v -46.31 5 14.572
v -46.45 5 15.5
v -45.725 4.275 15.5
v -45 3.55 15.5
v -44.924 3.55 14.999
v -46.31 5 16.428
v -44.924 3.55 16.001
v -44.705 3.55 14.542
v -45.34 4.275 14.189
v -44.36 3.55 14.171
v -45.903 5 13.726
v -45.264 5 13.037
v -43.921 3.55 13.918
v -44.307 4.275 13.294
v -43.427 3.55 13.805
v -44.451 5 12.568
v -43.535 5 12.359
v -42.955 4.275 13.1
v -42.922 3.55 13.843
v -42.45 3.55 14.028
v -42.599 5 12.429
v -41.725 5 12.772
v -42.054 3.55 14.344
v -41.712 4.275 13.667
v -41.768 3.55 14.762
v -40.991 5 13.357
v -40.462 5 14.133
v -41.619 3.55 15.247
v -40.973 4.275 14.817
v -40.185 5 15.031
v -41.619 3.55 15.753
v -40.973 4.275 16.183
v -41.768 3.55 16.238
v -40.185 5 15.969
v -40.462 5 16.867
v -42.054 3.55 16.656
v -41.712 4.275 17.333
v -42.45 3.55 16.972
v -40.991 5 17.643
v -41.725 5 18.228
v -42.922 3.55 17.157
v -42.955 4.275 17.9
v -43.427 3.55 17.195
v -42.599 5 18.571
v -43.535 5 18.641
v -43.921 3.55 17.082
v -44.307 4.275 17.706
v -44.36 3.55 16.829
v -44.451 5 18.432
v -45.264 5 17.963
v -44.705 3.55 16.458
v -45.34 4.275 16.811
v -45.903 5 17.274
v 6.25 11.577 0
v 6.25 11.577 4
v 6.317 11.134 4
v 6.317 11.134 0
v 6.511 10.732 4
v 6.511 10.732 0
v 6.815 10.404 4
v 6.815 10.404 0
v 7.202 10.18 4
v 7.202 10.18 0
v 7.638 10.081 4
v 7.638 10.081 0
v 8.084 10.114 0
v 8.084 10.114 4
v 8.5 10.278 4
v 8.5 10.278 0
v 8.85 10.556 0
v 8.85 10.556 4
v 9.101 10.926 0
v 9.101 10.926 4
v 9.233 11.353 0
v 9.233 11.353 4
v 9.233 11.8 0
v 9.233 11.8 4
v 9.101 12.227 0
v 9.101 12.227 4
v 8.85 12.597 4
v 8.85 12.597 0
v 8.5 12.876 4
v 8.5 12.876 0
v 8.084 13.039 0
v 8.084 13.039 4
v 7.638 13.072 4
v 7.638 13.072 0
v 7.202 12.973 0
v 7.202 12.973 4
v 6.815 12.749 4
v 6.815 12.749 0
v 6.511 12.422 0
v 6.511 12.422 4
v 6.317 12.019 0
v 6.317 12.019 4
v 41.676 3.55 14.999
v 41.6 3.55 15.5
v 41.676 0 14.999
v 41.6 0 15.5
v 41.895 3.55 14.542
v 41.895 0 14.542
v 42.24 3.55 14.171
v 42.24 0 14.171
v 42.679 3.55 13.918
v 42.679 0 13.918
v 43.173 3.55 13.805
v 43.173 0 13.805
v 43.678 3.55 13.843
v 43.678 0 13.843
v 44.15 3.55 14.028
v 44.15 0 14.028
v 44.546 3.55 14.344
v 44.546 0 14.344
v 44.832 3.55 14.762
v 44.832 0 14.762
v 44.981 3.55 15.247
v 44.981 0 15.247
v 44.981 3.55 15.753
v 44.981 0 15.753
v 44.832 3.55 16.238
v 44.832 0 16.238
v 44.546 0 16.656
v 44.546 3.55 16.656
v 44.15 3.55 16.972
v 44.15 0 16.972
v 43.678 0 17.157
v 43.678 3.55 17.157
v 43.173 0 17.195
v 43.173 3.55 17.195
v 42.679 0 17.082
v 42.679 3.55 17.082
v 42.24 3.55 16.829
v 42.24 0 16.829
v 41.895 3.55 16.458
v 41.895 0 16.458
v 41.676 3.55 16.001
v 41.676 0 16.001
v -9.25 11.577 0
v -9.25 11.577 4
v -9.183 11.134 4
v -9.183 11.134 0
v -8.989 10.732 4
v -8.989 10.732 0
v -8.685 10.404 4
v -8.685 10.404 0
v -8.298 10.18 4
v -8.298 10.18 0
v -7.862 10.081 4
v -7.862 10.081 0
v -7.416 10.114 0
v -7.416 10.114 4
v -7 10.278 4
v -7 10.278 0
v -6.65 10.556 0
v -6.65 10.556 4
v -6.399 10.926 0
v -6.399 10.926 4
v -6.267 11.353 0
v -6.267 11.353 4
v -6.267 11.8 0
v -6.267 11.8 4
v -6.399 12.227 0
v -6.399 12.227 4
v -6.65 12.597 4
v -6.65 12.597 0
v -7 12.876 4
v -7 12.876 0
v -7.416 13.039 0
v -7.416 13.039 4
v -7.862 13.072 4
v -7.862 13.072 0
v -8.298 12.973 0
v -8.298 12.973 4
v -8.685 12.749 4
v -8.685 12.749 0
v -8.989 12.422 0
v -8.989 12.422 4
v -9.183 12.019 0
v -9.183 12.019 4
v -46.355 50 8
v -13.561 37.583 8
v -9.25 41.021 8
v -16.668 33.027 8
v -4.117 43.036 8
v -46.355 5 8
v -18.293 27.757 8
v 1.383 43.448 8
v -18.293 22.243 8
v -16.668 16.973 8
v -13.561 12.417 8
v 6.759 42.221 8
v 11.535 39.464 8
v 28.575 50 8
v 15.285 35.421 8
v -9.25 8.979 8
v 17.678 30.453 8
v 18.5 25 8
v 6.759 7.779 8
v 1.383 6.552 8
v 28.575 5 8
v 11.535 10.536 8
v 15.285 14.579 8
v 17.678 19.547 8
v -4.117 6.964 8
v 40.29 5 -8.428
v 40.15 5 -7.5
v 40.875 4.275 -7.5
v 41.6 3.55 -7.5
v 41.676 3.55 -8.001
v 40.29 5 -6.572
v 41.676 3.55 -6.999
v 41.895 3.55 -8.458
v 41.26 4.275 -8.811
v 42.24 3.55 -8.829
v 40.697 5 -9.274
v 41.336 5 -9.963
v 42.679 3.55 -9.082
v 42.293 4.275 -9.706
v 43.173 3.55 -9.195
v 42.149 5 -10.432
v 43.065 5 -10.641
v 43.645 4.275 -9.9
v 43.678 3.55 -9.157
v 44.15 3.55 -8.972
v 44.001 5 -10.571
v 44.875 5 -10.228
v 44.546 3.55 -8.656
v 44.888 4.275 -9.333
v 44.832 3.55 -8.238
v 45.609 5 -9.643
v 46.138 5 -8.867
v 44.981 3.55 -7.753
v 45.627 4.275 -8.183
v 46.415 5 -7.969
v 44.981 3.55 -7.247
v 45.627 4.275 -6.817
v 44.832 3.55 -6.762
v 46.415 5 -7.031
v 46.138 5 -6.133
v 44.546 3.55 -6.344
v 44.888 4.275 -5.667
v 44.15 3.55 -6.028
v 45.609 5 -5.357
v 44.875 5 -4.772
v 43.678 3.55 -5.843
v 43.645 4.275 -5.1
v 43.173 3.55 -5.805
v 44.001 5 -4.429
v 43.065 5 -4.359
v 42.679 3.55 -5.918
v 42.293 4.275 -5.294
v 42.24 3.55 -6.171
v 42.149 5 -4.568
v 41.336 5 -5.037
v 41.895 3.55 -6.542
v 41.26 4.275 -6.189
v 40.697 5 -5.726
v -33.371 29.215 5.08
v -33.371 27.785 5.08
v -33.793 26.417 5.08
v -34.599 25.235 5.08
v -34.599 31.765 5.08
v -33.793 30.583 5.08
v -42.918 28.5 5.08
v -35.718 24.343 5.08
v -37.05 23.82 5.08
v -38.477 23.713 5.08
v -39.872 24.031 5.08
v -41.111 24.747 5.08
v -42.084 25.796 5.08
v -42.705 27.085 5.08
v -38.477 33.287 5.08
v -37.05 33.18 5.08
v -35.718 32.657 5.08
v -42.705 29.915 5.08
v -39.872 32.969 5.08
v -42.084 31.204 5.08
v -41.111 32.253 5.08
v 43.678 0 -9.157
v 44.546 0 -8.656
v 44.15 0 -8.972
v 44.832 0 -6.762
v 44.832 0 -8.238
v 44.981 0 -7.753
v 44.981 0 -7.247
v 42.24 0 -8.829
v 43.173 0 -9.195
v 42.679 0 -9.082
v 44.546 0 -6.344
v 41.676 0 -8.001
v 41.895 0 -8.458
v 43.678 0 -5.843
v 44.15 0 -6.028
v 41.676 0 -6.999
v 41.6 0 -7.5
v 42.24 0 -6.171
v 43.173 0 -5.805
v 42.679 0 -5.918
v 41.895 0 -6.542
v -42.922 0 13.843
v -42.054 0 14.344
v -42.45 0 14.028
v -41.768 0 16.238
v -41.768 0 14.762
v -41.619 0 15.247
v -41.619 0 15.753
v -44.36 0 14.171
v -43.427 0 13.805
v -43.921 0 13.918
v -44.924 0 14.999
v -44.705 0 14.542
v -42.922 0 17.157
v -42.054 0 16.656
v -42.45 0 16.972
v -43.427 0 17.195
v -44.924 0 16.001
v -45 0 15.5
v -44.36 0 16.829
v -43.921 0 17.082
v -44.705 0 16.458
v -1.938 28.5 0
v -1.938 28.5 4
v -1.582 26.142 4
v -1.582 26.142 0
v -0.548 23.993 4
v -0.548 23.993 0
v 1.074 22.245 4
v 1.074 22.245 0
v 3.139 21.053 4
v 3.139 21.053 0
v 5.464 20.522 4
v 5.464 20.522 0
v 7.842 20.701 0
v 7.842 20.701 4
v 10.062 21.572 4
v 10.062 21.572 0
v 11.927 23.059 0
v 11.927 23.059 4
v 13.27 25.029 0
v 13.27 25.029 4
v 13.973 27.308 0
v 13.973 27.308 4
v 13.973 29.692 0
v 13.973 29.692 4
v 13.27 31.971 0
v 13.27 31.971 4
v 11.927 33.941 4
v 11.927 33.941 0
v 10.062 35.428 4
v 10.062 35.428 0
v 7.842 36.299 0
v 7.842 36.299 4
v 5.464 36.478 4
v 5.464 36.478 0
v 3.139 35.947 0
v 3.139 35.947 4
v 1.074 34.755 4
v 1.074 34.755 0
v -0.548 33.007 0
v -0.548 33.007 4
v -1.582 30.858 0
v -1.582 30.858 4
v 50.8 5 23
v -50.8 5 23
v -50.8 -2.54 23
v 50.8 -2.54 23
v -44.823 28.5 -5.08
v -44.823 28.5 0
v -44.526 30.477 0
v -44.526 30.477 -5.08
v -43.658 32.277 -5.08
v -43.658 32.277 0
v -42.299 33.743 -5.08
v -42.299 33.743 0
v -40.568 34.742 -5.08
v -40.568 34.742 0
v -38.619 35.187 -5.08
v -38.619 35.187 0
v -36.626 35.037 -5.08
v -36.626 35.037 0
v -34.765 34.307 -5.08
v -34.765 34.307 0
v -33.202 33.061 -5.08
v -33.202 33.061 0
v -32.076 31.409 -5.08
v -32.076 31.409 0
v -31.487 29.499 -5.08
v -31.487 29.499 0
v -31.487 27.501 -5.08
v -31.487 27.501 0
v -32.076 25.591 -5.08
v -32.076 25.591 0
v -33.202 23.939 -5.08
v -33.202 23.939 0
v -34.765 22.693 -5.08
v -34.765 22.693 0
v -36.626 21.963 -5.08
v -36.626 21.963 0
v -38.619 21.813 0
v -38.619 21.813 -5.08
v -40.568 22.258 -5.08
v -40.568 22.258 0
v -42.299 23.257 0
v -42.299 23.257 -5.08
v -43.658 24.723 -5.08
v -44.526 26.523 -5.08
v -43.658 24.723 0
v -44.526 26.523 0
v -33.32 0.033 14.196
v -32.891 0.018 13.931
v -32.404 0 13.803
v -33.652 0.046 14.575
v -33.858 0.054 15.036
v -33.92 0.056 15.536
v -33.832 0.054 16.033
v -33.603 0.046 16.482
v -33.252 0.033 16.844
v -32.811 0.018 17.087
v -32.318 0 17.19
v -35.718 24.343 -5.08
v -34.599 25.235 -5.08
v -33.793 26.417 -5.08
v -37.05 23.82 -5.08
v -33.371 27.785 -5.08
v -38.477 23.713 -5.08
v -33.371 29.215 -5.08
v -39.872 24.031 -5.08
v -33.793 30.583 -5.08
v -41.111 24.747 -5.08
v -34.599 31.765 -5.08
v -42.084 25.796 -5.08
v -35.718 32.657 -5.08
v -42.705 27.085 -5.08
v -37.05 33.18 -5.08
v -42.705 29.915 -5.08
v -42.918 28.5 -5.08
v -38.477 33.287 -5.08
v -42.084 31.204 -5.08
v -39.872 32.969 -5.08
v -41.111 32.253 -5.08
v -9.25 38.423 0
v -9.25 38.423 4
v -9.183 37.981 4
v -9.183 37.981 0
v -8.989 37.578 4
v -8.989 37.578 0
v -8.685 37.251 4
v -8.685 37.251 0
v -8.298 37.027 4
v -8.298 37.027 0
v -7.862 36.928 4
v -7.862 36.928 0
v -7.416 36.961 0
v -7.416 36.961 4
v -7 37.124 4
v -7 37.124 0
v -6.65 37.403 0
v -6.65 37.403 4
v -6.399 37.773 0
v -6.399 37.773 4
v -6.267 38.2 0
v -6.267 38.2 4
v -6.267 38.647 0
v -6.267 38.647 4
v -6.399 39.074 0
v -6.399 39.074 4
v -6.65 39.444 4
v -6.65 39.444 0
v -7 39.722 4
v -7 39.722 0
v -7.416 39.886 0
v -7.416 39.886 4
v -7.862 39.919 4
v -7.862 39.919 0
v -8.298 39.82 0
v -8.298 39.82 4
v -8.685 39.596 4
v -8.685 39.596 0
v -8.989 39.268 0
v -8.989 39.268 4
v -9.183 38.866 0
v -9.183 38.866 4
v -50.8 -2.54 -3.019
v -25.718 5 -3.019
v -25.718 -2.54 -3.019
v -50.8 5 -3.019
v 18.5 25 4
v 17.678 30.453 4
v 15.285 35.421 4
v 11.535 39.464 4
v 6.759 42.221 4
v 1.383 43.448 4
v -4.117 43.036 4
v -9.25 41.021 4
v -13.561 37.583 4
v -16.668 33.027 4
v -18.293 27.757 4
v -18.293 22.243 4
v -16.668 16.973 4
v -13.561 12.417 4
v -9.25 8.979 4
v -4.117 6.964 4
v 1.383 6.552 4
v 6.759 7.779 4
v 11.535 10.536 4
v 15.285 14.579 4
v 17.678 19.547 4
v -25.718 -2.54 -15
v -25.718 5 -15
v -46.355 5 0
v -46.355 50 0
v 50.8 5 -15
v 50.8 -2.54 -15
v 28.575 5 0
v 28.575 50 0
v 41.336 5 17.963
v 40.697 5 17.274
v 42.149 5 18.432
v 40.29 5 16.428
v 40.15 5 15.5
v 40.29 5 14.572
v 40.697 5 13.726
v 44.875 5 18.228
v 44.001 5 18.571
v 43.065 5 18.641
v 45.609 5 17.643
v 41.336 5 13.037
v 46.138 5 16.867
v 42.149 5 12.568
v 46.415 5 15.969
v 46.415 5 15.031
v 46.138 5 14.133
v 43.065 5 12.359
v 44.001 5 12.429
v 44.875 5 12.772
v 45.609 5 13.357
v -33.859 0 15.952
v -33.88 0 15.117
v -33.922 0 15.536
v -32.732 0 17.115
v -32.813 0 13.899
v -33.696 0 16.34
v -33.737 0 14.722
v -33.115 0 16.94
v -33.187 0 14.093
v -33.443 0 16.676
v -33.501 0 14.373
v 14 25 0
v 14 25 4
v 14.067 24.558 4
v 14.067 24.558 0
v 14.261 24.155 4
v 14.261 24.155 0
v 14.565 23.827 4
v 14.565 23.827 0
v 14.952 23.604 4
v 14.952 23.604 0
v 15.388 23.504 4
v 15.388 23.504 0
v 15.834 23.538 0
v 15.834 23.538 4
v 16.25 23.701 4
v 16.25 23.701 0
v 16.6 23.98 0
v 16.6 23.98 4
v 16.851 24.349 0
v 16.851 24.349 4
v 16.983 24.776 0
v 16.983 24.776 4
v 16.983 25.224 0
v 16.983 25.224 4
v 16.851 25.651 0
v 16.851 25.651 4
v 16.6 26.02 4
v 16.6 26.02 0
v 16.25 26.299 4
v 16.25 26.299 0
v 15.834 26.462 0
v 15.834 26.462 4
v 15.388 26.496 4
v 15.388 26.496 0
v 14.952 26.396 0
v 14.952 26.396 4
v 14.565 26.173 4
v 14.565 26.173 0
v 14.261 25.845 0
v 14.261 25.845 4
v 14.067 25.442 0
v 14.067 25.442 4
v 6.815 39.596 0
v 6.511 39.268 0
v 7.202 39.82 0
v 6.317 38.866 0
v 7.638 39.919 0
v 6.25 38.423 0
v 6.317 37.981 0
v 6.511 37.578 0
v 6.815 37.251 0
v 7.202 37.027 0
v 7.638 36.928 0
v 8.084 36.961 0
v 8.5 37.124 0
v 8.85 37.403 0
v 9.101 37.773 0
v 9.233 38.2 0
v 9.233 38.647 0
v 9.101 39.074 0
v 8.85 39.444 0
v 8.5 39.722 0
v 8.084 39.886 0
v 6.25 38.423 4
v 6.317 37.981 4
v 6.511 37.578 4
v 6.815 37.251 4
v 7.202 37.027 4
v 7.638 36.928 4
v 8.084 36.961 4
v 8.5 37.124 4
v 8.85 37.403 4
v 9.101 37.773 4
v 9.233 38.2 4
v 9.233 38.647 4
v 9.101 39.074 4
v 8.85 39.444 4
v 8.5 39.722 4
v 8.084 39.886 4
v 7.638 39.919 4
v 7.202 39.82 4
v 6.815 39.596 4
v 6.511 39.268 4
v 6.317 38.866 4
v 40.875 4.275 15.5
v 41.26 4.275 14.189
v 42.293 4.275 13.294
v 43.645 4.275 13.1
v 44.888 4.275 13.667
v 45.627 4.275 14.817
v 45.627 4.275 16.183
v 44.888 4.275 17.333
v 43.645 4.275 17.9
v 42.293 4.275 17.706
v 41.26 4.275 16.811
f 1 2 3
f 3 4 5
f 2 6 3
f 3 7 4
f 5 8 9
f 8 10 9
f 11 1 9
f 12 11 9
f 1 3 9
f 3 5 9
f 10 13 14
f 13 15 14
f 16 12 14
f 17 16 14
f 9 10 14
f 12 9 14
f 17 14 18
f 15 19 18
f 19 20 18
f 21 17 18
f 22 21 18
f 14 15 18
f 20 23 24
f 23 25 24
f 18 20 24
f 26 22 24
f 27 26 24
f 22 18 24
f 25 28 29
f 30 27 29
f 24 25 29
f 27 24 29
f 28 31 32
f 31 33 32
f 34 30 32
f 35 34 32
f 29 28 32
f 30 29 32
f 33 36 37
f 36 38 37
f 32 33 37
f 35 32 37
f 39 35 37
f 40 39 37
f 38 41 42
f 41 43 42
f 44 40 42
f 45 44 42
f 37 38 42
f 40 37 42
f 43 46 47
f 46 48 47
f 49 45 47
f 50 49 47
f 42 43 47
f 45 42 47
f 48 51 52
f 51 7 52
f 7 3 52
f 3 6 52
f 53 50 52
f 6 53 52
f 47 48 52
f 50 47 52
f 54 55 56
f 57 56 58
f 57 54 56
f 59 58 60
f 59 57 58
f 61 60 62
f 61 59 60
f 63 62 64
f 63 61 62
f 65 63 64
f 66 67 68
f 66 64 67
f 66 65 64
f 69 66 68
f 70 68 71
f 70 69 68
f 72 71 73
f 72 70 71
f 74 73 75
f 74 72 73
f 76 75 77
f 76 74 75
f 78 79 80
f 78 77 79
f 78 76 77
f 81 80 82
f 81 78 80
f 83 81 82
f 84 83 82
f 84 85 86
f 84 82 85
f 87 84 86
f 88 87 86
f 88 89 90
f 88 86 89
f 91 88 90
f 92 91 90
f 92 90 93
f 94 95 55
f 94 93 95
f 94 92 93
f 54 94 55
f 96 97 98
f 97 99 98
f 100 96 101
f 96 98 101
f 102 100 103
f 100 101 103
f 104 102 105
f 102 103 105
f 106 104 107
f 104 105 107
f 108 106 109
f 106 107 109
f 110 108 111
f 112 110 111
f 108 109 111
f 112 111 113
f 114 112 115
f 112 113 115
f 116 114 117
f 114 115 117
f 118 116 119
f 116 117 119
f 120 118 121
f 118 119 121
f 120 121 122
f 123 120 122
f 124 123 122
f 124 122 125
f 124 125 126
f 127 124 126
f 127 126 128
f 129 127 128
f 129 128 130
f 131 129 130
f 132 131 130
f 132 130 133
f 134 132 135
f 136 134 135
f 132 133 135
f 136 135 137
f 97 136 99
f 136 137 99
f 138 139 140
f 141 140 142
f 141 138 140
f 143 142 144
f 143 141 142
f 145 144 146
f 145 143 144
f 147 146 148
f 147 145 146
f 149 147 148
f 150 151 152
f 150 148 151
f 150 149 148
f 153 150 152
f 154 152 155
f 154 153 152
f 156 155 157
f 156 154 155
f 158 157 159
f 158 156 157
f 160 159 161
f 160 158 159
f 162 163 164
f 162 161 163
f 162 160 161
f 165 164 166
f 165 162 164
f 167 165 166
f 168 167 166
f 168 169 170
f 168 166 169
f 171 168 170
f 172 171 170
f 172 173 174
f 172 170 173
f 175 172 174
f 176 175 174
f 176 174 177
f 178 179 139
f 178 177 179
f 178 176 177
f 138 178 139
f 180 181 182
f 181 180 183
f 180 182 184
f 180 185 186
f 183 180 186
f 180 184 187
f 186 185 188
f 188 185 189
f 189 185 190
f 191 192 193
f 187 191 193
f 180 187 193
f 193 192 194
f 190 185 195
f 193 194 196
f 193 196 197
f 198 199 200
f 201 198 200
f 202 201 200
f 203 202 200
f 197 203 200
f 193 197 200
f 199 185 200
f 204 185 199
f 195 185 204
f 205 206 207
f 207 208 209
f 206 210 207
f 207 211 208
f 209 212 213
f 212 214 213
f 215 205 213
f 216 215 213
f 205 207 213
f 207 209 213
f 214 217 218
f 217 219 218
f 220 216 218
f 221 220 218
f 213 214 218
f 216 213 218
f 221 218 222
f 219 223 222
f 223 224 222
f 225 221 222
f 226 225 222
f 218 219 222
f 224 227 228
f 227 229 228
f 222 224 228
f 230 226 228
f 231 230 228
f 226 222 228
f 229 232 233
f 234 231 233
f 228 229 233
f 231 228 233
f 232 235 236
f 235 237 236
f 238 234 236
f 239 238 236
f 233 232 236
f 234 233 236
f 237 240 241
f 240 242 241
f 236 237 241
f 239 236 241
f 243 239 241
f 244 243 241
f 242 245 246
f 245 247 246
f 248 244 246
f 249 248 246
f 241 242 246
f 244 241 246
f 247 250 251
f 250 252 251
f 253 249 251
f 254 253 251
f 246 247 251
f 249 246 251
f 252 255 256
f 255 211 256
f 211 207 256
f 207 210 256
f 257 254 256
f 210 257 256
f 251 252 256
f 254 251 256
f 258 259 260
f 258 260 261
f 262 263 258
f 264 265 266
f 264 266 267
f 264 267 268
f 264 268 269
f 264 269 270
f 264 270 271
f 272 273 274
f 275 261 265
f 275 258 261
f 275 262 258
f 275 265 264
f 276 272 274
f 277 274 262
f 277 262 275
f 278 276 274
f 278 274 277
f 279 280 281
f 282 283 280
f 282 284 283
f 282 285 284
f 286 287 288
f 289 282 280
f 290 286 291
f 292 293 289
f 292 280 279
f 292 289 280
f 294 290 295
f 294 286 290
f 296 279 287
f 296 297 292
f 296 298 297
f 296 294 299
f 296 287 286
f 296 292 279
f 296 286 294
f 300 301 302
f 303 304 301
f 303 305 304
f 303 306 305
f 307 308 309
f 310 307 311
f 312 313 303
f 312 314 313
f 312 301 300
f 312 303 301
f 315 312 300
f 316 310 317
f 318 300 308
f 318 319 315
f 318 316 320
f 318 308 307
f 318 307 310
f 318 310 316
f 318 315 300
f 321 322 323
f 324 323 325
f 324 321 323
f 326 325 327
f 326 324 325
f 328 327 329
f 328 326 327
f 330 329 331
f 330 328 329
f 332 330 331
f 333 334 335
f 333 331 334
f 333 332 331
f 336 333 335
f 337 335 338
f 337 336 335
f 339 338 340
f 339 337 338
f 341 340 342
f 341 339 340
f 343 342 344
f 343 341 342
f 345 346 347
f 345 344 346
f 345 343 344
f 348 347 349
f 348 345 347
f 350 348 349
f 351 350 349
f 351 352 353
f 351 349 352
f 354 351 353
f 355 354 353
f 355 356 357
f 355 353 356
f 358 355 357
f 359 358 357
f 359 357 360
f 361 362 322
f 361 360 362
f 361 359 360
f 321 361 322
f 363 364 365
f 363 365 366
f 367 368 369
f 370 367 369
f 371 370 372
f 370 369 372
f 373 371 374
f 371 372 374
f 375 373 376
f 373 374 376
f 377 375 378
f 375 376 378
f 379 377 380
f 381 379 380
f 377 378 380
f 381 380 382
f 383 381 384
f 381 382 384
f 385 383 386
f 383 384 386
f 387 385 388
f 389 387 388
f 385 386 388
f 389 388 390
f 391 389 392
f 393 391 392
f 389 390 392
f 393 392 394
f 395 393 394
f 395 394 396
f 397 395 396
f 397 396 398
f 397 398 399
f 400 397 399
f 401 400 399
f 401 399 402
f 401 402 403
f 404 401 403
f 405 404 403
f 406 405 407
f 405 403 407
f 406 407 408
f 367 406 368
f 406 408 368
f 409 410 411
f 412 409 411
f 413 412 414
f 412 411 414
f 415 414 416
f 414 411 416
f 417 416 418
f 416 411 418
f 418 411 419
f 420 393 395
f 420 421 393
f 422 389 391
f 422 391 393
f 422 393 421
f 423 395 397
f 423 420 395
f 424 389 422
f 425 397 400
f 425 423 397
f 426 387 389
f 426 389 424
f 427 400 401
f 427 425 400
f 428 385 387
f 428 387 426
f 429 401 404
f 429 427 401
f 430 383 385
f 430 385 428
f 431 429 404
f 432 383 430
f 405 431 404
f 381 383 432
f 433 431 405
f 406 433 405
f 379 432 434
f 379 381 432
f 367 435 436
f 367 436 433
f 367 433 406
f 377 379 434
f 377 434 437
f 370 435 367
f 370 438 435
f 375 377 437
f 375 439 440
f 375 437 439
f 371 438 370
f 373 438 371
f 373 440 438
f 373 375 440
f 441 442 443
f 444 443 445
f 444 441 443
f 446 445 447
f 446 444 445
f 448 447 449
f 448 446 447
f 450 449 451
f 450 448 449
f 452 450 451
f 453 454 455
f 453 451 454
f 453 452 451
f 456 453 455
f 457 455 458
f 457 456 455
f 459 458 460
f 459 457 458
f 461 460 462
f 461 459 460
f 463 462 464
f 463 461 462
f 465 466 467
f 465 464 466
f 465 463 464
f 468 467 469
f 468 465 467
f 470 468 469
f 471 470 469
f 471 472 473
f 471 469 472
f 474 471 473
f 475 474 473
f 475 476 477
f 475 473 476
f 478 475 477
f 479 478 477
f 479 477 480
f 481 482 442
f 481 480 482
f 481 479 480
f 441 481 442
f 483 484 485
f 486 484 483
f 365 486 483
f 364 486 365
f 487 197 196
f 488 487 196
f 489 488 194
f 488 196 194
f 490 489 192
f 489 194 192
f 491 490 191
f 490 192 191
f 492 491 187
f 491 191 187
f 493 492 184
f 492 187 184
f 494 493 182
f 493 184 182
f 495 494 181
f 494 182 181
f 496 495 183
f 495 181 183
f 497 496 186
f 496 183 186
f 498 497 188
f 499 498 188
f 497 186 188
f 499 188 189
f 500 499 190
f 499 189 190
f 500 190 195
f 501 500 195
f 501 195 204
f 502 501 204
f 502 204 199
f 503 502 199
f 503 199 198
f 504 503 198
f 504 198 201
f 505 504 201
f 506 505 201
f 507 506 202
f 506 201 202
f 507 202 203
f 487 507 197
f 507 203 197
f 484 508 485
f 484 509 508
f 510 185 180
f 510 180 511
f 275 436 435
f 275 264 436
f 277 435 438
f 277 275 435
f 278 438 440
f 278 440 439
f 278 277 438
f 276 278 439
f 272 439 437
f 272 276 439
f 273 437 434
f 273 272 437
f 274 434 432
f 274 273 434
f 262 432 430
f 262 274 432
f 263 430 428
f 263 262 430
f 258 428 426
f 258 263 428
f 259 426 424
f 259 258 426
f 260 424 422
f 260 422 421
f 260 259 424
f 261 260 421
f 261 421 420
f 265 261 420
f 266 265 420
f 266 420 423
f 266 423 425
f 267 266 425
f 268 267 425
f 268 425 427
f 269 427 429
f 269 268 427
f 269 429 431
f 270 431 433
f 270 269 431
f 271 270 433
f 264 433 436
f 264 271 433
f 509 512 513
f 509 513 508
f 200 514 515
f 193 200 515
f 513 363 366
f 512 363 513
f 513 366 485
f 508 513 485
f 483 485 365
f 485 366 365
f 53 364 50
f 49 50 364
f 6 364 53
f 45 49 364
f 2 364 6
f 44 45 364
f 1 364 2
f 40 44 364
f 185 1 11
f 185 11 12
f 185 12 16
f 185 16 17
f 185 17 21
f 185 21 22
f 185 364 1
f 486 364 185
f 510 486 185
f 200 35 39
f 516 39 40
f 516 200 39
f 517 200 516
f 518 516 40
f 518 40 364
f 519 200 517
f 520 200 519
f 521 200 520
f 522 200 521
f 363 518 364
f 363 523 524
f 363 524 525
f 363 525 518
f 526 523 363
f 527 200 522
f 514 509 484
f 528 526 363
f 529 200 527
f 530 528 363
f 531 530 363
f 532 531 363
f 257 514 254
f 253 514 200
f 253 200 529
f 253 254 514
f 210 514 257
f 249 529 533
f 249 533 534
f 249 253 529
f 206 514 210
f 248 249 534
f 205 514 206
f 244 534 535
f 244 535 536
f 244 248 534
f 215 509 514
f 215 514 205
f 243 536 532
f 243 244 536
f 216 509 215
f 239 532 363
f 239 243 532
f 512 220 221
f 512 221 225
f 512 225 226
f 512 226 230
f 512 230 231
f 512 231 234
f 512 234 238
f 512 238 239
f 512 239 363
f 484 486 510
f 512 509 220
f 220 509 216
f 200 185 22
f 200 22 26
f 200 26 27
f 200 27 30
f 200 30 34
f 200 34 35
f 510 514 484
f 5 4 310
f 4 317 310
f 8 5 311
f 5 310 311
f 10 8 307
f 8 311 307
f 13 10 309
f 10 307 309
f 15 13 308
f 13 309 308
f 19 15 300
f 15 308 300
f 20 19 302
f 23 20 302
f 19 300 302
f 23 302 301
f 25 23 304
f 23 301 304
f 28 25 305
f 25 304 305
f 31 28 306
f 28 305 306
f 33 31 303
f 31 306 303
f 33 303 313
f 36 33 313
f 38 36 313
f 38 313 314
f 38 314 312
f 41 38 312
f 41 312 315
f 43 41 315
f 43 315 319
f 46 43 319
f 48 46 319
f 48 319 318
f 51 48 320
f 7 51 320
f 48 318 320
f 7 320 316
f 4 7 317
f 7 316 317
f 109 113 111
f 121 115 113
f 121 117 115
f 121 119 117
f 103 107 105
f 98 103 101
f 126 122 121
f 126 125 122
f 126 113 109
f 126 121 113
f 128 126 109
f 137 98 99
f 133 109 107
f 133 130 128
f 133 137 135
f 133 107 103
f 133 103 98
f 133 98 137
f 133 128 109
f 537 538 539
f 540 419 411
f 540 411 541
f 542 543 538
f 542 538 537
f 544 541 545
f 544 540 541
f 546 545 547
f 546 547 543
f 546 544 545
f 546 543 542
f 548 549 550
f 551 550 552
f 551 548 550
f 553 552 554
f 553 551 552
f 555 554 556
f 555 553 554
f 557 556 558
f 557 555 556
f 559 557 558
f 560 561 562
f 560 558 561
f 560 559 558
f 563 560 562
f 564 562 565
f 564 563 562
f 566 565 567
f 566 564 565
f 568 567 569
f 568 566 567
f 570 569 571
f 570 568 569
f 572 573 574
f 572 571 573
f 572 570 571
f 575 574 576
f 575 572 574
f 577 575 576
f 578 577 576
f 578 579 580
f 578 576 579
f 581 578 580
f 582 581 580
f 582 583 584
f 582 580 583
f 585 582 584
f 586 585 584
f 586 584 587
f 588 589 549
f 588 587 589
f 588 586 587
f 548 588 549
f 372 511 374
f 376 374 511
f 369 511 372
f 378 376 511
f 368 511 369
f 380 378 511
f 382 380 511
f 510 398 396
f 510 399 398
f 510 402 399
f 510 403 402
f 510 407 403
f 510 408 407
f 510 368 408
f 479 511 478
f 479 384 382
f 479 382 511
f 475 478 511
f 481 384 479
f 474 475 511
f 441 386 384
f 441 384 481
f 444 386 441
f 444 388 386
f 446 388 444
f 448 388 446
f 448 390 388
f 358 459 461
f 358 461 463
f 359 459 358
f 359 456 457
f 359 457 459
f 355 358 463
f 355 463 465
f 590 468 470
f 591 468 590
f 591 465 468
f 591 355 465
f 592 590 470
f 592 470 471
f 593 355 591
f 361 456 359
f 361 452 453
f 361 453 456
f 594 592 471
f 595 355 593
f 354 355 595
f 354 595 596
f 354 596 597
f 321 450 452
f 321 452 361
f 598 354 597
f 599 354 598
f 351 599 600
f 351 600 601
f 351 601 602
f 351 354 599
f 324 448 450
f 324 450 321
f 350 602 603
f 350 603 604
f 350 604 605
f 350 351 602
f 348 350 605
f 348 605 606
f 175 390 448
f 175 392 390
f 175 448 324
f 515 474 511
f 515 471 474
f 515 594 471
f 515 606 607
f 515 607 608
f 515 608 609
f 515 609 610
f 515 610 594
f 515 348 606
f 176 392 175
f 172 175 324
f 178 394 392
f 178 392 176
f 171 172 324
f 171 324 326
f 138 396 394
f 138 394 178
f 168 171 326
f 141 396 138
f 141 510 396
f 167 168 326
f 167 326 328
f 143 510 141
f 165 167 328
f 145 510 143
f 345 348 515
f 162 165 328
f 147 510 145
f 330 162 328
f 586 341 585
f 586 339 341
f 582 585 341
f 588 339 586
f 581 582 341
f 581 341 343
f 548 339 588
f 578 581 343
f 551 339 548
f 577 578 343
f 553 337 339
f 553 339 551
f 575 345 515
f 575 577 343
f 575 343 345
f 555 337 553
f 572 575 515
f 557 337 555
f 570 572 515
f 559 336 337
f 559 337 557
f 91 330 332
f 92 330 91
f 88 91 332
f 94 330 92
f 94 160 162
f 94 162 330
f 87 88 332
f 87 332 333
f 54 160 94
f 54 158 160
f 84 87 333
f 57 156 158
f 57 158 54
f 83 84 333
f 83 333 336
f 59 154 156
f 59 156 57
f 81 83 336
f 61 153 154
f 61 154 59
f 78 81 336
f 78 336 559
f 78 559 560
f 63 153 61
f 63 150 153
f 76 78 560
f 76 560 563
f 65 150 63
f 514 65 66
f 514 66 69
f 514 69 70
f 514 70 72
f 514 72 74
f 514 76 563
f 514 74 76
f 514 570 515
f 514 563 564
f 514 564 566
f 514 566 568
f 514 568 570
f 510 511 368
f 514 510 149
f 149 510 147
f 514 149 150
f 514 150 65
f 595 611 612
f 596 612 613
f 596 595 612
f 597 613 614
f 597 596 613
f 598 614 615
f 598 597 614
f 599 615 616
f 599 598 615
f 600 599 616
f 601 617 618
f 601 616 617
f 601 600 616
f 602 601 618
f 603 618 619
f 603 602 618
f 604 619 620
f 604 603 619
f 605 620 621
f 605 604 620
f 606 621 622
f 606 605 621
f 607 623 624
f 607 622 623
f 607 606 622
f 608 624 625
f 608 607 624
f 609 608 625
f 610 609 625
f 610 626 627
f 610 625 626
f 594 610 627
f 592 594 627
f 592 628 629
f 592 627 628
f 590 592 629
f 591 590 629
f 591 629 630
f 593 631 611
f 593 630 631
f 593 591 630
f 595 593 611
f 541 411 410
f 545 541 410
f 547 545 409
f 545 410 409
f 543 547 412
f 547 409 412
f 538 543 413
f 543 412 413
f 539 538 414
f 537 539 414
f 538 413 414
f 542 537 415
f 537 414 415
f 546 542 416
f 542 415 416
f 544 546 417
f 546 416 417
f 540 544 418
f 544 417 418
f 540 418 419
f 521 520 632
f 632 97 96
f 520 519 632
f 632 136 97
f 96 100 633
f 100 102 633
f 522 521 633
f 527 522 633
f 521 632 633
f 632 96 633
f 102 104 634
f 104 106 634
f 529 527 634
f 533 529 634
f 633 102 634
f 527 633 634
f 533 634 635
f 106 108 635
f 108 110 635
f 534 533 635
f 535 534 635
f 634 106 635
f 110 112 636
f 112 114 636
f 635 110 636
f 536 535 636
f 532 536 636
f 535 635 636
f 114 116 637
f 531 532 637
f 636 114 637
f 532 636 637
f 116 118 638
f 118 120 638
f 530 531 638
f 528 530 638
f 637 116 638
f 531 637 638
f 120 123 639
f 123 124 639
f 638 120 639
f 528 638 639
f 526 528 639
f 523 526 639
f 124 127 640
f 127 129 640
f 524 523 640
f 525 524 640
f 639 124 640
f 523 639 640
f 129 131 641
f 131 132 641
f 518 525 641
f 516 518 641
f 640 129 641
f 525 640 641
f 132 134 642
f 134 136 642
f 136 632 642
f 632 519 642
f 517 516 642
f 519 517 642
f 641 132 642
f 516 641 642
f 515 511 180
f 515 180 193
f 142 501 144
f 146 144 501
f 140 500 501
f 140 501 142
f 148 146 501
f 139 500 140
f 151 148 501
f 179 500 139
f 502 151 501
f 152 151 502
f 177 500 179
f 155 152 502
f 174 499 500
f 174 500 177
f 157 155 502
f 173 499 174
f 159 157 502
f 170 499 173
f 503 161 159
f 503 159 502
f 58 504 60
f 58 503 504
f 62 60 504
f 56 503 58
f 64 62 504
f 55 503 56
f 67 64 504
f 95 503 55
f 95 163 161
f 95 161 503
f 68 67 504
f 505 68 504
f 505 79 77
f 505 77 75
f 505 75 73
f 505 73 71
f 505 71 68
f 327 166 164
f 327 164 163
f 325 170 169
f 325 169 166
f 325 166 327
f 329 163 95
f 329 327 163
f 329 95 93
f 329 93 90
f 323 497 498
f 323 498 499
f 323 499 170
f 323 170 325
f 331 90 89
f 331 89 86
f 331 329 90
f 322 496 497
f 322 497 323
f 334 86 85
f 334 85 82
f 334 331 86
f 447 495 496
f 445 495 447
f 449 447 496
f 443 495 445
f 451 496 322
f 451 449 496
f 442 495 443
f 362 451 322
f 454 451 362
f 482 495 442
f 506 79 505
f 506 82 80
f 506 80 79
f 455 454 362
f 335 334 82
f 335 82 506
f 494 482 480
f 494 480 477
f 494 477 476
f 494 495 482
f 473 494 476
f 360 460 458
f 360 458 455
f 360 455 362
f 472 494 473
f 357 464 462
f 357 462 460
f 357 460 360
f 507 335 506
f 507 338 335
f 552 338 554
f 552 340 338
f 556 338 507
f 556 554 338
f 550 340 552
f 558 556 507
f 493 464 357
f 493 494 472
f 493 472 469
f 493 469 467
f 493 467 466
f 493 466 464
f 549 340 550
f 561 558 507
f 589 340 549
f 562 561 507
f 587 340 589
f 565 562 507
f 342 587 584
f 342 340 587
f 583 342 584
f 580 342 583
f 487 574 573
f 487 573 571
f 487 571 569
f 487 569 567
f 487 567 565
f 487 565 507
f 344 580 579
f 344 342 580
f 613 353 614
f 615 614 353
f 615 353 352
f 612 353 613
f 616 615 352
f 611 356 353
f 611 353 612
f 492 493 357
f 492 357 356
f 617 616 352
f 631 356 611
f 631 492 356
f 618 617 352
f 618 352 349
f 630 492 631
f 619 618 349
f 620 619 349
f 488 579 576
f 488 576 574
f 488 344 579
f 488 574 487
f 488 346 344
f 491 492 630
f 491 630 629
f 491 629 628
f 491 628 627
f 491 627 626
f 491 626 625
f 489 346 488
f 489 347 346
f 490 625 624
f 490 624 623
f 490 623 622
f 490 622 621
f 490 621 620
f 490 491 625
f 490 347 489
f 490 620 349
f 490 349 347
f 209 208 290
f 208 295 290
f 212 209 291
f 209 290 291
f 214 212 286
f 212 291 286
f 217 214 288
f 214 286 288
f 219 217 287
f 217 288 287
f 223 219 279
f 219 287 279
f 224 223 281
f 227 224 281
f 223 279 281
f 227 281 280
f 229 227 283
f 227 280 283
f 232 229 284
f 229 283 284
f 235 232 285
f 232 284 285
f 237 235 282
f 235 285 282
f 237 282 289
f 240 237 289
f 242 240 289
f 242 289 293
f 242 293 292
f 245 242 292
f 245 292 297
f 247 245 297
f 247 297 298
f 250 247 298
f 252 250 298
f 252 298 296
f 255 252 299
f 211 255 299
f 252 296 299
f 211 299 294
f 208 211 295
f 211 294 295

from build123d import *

# Parameters (mm, degrees)
SKETCH3_W                                       = 57.15
SKETCH3_H                                       = 50
BOSS_EXTRUDE1_DEPTH                             = 8
SKETCH3_3_R                                     = 1.5
SKETCH3_3_R_2                                   = 8
CUT_EXTRUDE2_DEPTH                              = 10
SKETCH4_R                                       = 18.5
CUT_EXTRUDE3_DEPTH                              = 4
BOSS_EXTRUDE2_DEPTH                             = 15
BOSS_EXTRUDE2_DEPTH_BACK                        = 23
SKETCH6_W                                       = 101.6
SKETCH6_H                                       = 5
CSK_FOR_M3_FLAT_HEAD_MACHINE_SCREW1_D           = 3.4
CSK_FOR_M3_FLAT_HEAD_MACHINE_SCREW1_CSINK_D     = 6.3
CSK_FOR_M3_FLAT_HEAD_MACHINE_SCREW1_CSINK_ANGLE = 90
CUT_EXTRUDE6_REACH                              = 555.432
SKETCH16_R                                      = 1.7
CUT_EXTRUDE7_REACH                              = 73.656
SKETCH17_W                                      = 25.08228791
SKETCH17_H                                      = 11.980848154
SKETCH18_W                                      = 17.78
SKETCH18_H                                      = 8
BOSS_EXTRUDE3_DEPTH                             = 45
SKETCH13_R                                      = 6.7056
SKETCH13_R_2                                    = 4.8006
BOSS_EXTRUDE4_DEPTH                             = 5.08
CUT_EXTRUDE8_START                              = -5.08
SKETCH19_R                                      = 4.8006
CUT_EXTRUDE8_DEPTH                              = 5.08
BOSS_EXTRUDE5_DEPTH                             = 2.54


with BuildPart() as part:
    # Sketch3 → Boss-Extrude1 (new body)
    with BuildSketch(Plane.XY):
        with Locations((0, 25)):
            Rectangle(SKETCH3_W, SKETCH3_H)
    extrude(amount=BOSS_EXTRUDE1_DEPTH)

    # Sketch3<3> → Cut-Extrude2 (cut)
    with BuildSketch(Plane.XY):
        with Locations(Location((-7.75, 38.423393759, 0), (0, 0, 180))):
            Circle(SKETCH3_3_R)
        with Locations(Location((7.75, 38.423393759, 0), (0, 0, 180))):
            Circle(SKETCH3_3_R)
        with Locations(Location((-7.75, 11.576606241, 0), (0, 0, 180))):
            Circle(SKETCH3_3_R)
        with Locations(Location((7.75, 11.576606241, 0), (0, 0, 180))):
            Circle(SKETCH3_3_R)
        with Locations(Location((15.5, 25, 0), (0, 0, 180))):
            Circle(SKETCH3_3_R)
        with Locations(Location((6.062177825, 28.499999999, 0), (0, 0, 180))):
            Circle(SKETCH3_3_R_2)
    extrude(amount=CUT_EXTRUDE2_DEPTH, mode=Mode.SUBTRACT)

    # Sketch4 → Cut-Extrude3 (cut)
    with BuildSketch(Plane.XY.offset(8)):
        with Locations((0, 25)):
            Circle(SKETCH4_R)
    extrude(amount=-CUT_EXTRUDE3_DEPTH, mode=Mode.SUBTRACT)

    # Sketch6 → Boss-Extrude2 (add, two sides: drawn at the far end of the back side and taken through both)
    with BuildSketch(Plane.XY.offset(8).offset(-BOSS_EXTRUDE2_DEPTH_BACK)):
        with Locations((0, 2.5)):
            Rectangle(SKETCH6_W, SKETCH6_H)
    extrude(amount=BOSS_EXTRUDE2_DEPTH + BOSS_EXTRUDE2_DEPTH_BACK)

    # CSK for M3 Flat Head Machine Screw1 (through all)
    with Locations(Plane(origin=(0, 5, 0), x_dir=(1, 0, 0), z_dir=(0, 1, 0))):
        with Locations((-43.3, 7.5), (-43.3, -15.5), (43.3, -15.5), (43.3, 7.5)):
            CounterSinkHole(CSK_FOR_M3_FLAT_HEAD_MACHINE_SCREW1_D / 2, CSK_FOR_M3_FLAT_HEAD_MACHINE_SCREW1_CSINK_D / 2, counter_sink_angle=CSK_FOR_M3_FLAT_HEAD_MACHINE_SCREW1_CSINK_ANGLE)

    # Sketch16 → Cut-Extrude6 (cut, up to next)
    with BuildSketch(Plane(origin=(-499.248949842, 16.821159134, -28.308871479), x_dir=(0.050830850863696445, -0.0009181581696577921, 0.9987068546806156), z_dir=(0.036090886531912156, 0.9993480899541041, -0.0009181581696584951)), mode=Mode.PRIVATE) as cut_extrude6_sk1:
        with Locations((67.5, 464.499999998)):
            Circle(SKETCH16_R)
    cut_extrude6_tool1 = extrude(cut_extrude6_sk1.sketch, amount=-CUT_EXTRUDE6_REACH, mode=Mode.PRIVATE) & part.part
    # Sketch16 → Cut-Extrude6 (cut, up to next)
    with BuildSketch(Plane(origin=(-499.248949842, 16.821159134, -28.308871479), x_dir=(0.050830850863696445, -0.0009181581696577921, 0.9987068546806156), z_dir=(0.036090886531912156, 0.9993480899541041, -0.0009181581696584951)), mode=Mode.PRIVATE) as cut_extrude6_sk2:
        with Locations((44.5, 464.499999998)):
            Circle(SKETCH16_R)
    cut_extrude6_tool2 = extrude(cut_extrude6_sk2.sketch, amount=-CUT_EXTRUDE6_REACH, mode=Mode.PRIVATE) & part.part
    add(cut_extrude6_tool1.solids().sort_by_distance((-32.221346, -0.005033, 15.492911))[0], mode=Mode.SUBTRACT)
    add(cut_extrude6_tool2.solids().sort_by_distance((-33.390455, 0.016084, -7.477347))[0], mode=Mode.SUBTRACT)

    # Sketch17 → Cut-Extrude7 (cut, up to next)
    with BuildSketch(Plane(origin=(0, 5, 0), x_dir=(1, 0, 0), z_dir=(0, 1, 0)), mode=Mode.PRIVATE) as cut_extrude7_sk1:
        with Locations((-38.258856045, 9.009575923)):
            Rectangle(SKETCH17_W, SKETCH17_H)
    cut_extrude7_tool1 = extrude(cut_extrude7_sk1.sketch, amount=-CUT_EXTRUDE7_REACH, mode=Mode.PRIVATE) & part.part
    add(cut_extrude7_tool1.solids().sort_by_distance((-38.258856, 5, -9.009576))[0], mode=Mode.SUBTRACT)

    # Sketch18 → Boss-Extrude3 (add)
    with BuildSketch(Plane(origin=(0, 5, 0), x_dir=(1, 0, 0), z_dir=(0, 1, 0))):
        with Locations((-37.465, -4)):
            Rectangle(SKETCH18_W, SKETCH18_H)
    extrude(amount=BOSS_EXTRUDE3_DEPTH)

    # Sketch13 → Boss-Extrude4 (add)
    with BuildSketch(Plane(origin=(0, 0, 0), x_dir=(-1, 0, 0), z_dir=(0, 0, -1))):
        with Locations((38.117822207, 28.499999999)):
            Circle(SKETCH13_R)
        with Locations((38.117822207, 28.499999999)):
            Circle(SKETCH13_R_2, mode=Mode.SUBTRACT)
    extrude(amount=BOSS_EXTRUDE4_DEPTH)

    # Sketch19 → Cut-Extrude8 (cut)
    with BuildSketch(Plane(origin=(0, 0, 0), x_dir=(-1, 0, 0), z_dir=(0, 0, -1)).offset(CUT_EXTRUDE8_START)):
        with Locations((38.117822207, 28.499999999)):
            Circle(SKETCH19_R)
    extrude(amount=CUT_EXTRUDE8_DEPTH, mode=Mode.SUBTRACT)

    # Sketch20 → Boss-Extrude5 (add)
    with BuildSketch(Plane.XZ):
        Polygon((-50.8, -3.019151846), (-50.8, 23), (50.8, 23), (50.8, -15), (-25.71771209, -15), (-25.71771209, -3.019151846), align=None)
    extrude(amount=BOSS_EXTRUDE5_DEPTH)


solid = part.part
